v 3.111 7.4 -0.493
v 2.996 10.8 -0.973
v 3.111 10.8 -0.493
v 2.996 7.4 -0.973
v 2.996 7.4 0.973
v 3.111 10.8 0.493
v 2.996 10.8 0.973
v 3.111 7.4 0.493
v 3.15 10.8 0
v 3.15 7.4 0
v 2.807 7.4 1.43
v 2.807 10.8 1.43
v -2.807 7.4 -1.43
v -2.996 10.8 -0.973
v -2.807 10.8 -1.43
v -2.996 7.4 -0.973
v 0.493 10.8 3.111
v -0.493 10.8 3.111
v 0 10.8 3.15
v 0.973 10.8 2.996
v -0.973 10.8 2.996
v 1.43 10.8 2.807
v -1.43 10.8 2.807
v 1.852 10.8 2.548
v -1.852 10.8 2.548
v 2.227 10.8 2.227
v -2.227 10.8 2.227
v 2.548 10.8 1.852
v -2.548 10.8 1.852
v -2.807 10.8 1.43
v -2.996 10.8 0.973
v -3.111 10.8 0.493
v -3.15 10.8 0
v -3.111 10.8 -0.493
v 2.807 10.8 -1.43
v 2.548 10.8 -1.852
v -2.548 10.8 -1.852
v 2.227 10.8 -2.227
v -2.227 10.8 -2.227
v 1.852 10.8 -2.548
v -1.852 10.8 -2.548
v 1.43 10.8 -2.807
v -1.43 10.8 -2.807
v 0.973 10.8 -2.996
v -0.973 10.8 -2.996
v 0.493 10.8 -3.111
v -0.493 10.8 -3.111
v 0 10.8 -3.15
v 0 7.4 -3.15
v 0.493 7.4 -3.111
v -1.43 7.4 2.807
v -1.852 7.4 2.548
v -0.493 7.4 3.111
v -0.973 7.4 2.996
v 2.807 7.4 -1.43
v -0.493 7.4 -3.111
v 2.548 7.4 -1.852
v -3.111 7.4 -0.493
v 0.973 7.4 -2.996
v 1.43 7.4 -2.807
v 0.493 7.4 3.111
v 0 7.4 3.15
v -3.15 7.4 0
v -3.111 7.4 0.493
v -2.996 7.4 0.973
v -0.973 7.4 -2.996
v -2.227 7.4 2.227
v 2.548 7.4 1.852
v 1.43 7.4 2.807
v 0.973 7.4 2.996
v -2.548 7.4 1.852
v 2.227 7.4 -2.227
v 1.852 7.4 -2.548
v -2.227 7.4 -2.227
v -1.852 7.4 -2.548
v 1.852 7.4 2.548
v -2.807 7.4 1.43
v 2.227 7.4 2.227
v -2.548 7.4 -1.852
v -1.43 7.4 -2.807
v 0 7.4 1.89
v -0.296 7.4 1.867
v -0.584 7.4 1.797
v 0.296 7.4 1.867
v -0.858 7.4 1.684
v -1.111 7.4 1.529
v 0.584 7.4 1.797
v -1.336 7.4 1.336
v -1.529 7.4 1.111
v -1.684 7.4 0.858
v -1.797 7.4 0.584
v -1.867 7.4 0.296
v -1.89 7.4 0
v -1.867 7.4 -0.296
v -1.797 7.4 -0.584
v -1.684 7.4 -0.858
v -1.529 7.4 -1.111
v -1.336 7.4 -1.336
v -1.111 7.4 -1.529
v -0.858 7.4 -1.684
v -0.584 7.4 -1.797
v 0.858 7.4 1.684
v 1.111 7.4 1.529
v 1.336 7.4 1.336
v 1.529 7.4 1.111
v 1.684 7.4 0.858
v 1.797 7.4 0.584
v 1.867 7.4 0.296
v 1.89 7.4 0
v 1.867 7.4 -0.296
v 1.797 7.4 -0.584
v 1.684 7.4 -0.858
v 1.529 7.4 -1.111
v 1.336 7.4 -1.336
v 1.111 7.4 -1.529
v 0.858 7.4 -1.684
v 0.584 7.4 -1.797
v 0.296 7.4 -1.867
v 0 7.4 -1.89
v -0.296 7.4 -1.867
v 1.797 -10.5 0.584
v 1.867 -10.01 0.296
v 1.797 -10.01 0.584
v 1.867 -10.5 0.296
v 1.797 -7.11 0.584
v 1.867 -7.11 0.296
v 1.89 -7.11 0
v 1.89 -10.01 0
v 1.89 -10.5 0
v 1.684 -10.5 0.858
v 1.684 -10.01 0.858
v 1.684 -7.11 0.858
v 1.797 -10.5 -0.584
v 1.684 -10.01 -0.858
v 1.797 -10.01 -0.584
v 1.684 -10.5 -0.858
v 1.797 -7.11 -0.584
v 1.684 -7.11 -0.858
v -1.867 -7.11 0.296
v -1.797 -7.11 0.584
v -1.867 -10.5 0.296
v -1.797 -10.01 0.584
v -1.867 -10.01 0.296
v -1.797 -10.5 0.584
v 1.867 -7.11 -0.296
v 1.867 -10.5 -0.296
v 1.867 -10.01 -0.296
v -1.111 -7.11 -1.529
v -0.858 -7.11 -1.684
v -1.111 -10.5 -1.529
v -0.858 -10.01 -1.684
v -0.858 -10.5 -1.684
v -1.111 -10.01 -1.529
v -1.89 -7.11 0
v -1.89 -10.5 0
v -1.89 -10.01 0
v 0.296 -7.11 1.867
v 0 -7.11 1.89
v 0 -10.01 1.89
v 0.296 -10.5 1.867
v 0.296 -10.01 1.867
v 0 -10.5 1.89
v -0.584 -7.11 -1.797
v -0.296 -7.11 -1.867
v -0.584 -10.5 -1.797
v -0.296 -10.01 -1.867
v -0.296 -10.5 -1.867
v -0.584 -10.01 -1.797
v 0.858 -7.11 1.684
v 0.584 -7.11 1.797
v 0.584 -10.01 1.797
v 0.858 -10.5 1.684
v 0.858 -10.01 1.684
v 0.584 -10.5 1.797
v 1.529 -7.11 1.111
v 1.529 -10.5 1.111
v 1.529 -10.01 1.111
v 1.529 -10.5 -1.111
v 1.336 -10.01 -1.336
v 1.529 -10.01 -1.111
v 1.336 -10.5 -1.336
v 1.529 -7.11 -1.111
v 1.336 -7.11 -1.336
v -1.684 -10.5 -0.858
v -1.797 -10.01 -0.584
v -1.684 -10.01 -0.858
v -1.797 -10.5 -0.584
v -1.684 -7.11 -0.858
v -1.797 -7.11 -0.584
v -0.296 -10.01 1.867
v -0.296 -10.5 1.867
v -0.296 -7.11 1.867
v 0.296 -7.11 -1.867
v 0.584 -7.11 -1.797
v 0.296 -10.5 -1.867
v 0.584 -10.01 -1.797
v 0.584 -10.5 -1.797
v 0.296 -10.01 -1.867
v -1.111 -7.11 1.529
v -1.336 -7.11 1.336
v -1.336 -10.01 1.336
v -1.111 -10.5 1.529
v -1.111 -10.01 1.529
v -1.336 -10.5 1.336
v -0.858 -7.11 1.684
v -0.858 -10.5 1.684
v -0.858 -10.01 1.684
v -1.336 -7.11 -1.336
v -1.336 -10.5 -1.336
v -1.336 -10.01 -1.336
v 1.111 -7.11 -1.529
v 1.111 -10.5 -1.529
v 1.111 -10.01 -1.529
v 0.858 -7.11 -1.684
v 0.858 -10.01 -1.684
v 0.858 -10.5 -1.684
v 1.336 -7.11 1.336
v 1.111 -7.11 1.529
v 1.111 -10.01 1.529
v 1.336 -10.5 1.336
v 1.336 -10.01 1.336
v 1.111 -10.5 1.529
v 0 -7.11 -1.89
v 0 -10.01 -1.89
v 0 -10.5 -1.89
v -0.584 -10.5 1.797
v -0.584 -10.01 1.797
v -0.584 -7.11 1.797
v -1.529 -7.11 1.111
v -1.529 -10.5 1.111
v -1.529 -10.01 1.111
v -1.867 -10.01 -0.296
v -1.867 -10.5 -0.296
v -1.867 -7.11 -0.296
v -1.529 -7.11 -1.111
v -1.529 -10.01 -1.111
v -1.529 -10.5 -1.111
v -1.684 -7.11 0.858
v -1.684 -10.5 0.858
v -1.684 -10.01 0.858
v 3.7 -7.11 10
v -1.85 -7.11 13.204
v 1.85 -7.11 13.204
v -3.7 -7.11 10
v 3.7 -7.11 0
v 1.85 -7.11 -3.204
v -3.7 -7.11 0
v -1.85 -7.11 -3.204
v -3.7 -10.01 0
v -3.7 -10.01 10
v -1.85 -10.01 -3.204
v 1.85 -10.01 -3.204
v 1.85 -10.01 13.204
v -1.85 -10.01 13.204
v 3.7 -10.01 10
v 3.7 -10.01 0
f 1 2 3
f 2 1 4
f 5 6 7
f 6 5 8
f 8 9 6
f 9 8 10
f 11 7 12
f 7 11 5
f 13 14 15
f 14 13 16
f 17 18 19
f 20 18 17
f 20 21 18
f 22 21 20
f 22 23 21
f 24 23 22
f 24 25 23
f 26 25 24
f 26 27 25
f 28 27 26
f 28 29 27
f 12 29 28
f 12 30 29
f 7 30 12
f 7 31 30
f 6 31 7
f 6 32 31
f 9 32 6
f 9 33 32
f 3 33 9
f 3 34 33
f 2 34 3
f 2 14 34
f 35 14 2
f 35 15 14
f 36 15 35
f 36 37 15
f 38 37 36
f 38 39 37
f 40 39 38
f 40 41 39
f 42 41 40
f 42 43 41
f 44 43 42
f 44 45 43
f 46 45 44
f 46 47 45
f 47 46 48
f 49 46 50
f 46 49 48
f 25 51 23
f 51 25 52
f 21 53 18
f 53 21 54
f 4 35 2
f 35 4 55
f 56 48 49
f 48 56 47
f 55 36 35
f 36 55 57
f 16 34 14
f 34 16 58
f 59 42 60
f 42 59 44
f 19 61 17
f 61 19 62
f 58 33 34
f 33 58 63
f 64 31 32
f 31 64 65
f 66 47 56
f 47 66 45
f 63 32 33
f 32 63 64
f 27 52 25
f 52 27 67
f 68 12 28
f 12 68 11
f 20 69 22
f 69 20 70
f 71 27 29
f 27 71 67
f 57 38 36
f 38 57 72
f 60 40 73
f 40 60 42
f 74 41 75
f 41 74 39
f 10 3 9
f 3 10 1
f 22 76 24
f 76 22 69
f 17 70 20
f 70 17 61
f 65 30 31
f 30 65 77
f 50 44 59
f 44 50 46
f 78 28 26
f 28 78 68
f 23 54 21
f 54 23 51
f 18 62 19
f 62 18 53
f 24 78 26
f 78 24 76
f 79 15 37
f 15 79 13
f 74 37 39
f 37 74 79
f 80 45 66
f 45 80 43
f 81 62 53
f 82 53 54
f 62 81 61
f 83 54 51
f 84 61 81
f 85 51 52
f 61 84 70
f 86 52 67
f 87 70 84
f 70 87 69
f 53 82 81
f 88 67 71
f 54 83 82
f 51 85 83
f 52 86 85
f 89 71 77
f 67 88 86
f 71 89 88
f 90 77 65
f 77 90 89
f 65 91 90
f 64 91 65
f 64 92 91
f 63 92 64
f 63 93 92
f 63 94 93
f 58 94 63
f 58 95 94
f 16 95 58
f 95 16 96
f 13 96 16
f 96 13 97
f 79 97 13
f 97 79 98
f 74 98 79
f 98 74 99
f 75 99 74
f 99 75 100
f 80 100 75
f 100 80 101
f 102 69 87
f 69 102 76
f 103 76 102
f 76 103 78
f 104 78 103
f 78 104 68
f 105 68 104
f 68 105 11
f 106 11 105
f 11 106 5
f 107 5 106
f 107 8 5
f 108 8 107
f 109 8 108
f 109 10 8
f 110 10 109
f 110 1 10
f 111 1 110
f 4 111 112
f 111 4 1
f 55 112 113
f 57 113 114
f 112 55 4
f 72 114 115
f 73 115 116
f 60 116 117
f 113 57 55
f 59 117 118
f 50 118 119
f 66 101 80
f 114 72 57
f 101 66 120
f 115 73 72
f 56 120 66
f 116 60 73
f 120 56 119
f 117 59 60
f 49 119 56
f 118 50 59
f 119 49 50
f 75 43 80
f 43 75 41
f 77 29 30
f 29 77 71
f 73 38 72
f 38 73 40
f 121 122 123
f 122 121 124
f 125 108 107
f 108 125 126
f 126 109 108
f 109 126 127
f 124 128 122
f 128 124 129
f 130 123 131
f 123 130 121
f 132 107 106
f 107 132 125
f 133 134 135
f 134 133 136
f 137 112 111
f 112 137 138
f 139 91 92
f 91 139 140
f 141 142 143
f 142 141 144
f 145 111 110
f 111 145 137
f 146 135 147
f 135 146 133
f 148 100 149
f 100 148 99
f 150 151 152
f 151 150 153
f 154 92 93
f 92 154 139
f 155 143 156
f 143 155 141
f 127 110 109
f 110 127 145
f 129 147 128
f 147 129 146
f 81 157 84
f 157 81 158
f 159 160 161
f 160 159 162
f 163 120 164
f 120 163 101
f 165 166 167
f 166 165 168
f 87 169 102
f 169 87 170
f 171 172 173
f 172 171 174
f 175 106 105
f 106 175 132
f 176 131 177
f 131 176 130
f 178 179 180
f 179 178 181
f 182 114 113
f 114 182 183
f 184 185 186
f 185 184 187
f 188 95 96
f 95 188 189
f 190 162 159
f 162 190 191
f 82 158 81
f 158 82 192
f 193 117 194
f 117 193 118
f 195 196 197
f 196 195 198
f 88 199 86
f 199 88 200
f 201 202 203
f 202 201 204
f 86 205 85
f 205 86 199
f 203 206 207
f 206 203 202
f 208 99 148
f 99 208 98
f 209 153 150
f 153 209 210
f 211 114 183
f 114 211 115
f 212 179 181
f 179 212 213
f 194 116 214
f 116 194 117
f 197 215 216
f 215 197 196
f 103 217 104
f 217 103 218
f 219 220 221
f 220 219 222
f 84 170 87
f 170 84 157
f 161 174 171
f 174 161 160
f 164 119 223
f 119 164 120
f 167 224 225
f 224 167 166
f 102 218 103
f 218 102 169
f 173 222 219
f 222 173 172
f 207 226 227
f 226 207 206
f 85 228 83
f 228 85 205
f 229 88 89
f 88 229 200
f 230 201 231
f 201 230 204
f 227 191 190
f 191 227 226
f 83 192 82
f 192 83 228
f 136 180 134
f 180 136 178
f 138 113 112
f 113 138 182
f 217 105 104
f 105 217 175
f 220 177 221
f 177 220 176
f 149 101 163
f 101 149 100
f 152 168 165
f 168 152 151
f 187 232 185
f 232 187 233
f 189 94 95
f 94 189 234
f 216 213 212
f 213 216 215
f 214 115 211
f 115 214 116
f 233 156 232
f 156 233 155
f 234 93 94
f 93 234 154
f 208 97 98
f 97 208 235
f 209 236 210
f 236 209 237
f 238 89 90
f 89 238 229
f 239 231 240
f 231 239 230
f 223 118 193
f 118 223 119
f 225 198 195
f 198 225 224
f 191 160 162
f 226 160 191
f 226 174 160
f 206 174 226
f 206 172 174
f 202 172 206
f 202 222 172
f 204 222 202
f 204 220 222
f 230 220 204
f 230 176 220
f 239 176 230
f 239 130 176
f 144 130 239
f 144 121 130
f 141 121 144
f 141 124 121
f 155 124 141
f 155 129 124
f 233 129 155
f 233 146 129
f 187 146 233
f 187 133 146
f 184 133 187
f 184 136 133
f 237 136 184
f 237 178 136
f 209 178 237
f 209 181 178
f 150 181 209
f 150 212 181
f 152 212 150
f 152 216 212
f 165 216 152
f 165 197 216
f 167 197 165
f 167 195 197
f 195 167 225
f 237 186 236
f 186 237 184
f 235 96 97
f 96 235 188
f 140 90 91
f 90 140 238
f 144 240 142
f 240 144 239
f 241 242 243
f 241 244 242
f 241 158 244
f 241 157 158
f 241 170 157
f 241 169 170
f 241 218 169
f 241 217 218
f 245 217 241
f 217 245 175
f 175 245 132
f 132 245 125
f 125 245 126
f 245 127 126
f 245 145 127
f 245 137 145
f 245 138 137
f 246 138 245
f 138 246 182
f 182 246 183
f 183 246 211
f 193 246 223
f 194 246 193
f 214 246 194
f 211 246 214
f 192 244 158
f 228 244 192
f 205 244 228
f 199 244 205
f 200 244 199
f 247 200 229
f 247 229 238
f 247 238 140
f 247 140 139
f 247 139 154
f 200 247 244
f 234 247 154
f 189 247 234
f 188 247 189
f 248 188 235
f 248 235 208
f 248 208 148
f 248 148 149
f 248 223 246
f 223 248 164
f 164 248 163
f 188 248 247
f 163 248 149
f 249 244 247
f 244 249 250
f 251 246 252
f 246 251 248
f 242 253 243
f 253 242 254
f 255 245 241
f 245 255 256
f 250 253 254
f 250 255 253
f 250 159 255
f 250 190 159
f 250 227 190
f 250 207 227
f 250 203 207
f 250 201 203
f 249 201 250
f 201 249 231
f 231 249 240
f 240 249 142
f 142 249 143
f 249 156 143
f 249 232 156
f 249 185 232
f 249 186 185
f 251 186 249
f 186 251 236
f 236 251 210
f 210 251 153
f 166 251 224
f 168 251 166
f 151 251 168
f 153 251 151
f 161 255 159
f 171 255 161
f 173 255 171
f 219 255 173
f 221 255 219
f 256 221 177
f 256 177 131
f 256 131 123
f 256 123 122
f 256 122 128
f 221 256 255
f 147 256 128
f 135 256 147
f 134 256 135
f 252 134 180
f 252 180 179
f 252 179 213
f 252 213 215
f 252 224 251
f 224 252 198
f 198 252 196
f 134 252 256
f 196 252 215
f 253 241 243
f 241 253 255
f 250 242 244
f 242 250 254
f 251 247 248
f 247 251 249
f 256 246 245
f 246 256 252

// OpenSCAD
// This file is part of Cyclone PCB Factory: a 3D printable CNC machine for PCB manufacture
// http://reprap.org/wiki/Cyclone_PCB_Factory
// Author: Carlosgs (http://carlosgs.es)
// License: Attribution - Share Alike - Creative Commons (http://creativecommons.org/licenses/by-sa/3.0/)

include <MCAD/nuts_and_bolts.scad>

module hole_for_screw(size=3,length=20,nutDepth=5,nutAddedLen=0,captiveLen=0,tolerance=0.5) {
	*translate([0,-length/2+nutDepth,0])
		rotate([90,0,0])
		hull() {
		translate([0,0,nutDepth])
			scale([1,1,0.01])
			nutHole(size=size, tolerance=tolerance, proj=-1);
		scale([1,1,0.01]) nutHole(size=size, tolerance=tolerance, proj=-1);
		}
	radius = METRIC_NUT_AC_WIDTHS[size]/2+tolerance;
	height = METRIC_NUT_THICKNESS[size]+tolerance;
	translate([0,-length/2+height+nutAddedLen+nutDepth-0.01,0])
		scale([1,(height+nutAddedLen)/height,1])
			rotate([90,0,0])
				hull() {
					nutHole(size=size, tolerance=tolerance, proj=-1);
					translate([0,captiveLen,0])
						nutHole(size=size, tolerance=tolerance, proj=-1);
				}
	translate([0,length/2-2.6,0])
		rotate([90,0,0])
			render() boltHole(size=size, length=length-2.6+0.5, tolerance=tolerance-0.1, proj=-1, $fn=40);
}

hole_for_screw(size=3,length=20,nutDepth=0,nutAddedLen=0,captiveLen=10);
